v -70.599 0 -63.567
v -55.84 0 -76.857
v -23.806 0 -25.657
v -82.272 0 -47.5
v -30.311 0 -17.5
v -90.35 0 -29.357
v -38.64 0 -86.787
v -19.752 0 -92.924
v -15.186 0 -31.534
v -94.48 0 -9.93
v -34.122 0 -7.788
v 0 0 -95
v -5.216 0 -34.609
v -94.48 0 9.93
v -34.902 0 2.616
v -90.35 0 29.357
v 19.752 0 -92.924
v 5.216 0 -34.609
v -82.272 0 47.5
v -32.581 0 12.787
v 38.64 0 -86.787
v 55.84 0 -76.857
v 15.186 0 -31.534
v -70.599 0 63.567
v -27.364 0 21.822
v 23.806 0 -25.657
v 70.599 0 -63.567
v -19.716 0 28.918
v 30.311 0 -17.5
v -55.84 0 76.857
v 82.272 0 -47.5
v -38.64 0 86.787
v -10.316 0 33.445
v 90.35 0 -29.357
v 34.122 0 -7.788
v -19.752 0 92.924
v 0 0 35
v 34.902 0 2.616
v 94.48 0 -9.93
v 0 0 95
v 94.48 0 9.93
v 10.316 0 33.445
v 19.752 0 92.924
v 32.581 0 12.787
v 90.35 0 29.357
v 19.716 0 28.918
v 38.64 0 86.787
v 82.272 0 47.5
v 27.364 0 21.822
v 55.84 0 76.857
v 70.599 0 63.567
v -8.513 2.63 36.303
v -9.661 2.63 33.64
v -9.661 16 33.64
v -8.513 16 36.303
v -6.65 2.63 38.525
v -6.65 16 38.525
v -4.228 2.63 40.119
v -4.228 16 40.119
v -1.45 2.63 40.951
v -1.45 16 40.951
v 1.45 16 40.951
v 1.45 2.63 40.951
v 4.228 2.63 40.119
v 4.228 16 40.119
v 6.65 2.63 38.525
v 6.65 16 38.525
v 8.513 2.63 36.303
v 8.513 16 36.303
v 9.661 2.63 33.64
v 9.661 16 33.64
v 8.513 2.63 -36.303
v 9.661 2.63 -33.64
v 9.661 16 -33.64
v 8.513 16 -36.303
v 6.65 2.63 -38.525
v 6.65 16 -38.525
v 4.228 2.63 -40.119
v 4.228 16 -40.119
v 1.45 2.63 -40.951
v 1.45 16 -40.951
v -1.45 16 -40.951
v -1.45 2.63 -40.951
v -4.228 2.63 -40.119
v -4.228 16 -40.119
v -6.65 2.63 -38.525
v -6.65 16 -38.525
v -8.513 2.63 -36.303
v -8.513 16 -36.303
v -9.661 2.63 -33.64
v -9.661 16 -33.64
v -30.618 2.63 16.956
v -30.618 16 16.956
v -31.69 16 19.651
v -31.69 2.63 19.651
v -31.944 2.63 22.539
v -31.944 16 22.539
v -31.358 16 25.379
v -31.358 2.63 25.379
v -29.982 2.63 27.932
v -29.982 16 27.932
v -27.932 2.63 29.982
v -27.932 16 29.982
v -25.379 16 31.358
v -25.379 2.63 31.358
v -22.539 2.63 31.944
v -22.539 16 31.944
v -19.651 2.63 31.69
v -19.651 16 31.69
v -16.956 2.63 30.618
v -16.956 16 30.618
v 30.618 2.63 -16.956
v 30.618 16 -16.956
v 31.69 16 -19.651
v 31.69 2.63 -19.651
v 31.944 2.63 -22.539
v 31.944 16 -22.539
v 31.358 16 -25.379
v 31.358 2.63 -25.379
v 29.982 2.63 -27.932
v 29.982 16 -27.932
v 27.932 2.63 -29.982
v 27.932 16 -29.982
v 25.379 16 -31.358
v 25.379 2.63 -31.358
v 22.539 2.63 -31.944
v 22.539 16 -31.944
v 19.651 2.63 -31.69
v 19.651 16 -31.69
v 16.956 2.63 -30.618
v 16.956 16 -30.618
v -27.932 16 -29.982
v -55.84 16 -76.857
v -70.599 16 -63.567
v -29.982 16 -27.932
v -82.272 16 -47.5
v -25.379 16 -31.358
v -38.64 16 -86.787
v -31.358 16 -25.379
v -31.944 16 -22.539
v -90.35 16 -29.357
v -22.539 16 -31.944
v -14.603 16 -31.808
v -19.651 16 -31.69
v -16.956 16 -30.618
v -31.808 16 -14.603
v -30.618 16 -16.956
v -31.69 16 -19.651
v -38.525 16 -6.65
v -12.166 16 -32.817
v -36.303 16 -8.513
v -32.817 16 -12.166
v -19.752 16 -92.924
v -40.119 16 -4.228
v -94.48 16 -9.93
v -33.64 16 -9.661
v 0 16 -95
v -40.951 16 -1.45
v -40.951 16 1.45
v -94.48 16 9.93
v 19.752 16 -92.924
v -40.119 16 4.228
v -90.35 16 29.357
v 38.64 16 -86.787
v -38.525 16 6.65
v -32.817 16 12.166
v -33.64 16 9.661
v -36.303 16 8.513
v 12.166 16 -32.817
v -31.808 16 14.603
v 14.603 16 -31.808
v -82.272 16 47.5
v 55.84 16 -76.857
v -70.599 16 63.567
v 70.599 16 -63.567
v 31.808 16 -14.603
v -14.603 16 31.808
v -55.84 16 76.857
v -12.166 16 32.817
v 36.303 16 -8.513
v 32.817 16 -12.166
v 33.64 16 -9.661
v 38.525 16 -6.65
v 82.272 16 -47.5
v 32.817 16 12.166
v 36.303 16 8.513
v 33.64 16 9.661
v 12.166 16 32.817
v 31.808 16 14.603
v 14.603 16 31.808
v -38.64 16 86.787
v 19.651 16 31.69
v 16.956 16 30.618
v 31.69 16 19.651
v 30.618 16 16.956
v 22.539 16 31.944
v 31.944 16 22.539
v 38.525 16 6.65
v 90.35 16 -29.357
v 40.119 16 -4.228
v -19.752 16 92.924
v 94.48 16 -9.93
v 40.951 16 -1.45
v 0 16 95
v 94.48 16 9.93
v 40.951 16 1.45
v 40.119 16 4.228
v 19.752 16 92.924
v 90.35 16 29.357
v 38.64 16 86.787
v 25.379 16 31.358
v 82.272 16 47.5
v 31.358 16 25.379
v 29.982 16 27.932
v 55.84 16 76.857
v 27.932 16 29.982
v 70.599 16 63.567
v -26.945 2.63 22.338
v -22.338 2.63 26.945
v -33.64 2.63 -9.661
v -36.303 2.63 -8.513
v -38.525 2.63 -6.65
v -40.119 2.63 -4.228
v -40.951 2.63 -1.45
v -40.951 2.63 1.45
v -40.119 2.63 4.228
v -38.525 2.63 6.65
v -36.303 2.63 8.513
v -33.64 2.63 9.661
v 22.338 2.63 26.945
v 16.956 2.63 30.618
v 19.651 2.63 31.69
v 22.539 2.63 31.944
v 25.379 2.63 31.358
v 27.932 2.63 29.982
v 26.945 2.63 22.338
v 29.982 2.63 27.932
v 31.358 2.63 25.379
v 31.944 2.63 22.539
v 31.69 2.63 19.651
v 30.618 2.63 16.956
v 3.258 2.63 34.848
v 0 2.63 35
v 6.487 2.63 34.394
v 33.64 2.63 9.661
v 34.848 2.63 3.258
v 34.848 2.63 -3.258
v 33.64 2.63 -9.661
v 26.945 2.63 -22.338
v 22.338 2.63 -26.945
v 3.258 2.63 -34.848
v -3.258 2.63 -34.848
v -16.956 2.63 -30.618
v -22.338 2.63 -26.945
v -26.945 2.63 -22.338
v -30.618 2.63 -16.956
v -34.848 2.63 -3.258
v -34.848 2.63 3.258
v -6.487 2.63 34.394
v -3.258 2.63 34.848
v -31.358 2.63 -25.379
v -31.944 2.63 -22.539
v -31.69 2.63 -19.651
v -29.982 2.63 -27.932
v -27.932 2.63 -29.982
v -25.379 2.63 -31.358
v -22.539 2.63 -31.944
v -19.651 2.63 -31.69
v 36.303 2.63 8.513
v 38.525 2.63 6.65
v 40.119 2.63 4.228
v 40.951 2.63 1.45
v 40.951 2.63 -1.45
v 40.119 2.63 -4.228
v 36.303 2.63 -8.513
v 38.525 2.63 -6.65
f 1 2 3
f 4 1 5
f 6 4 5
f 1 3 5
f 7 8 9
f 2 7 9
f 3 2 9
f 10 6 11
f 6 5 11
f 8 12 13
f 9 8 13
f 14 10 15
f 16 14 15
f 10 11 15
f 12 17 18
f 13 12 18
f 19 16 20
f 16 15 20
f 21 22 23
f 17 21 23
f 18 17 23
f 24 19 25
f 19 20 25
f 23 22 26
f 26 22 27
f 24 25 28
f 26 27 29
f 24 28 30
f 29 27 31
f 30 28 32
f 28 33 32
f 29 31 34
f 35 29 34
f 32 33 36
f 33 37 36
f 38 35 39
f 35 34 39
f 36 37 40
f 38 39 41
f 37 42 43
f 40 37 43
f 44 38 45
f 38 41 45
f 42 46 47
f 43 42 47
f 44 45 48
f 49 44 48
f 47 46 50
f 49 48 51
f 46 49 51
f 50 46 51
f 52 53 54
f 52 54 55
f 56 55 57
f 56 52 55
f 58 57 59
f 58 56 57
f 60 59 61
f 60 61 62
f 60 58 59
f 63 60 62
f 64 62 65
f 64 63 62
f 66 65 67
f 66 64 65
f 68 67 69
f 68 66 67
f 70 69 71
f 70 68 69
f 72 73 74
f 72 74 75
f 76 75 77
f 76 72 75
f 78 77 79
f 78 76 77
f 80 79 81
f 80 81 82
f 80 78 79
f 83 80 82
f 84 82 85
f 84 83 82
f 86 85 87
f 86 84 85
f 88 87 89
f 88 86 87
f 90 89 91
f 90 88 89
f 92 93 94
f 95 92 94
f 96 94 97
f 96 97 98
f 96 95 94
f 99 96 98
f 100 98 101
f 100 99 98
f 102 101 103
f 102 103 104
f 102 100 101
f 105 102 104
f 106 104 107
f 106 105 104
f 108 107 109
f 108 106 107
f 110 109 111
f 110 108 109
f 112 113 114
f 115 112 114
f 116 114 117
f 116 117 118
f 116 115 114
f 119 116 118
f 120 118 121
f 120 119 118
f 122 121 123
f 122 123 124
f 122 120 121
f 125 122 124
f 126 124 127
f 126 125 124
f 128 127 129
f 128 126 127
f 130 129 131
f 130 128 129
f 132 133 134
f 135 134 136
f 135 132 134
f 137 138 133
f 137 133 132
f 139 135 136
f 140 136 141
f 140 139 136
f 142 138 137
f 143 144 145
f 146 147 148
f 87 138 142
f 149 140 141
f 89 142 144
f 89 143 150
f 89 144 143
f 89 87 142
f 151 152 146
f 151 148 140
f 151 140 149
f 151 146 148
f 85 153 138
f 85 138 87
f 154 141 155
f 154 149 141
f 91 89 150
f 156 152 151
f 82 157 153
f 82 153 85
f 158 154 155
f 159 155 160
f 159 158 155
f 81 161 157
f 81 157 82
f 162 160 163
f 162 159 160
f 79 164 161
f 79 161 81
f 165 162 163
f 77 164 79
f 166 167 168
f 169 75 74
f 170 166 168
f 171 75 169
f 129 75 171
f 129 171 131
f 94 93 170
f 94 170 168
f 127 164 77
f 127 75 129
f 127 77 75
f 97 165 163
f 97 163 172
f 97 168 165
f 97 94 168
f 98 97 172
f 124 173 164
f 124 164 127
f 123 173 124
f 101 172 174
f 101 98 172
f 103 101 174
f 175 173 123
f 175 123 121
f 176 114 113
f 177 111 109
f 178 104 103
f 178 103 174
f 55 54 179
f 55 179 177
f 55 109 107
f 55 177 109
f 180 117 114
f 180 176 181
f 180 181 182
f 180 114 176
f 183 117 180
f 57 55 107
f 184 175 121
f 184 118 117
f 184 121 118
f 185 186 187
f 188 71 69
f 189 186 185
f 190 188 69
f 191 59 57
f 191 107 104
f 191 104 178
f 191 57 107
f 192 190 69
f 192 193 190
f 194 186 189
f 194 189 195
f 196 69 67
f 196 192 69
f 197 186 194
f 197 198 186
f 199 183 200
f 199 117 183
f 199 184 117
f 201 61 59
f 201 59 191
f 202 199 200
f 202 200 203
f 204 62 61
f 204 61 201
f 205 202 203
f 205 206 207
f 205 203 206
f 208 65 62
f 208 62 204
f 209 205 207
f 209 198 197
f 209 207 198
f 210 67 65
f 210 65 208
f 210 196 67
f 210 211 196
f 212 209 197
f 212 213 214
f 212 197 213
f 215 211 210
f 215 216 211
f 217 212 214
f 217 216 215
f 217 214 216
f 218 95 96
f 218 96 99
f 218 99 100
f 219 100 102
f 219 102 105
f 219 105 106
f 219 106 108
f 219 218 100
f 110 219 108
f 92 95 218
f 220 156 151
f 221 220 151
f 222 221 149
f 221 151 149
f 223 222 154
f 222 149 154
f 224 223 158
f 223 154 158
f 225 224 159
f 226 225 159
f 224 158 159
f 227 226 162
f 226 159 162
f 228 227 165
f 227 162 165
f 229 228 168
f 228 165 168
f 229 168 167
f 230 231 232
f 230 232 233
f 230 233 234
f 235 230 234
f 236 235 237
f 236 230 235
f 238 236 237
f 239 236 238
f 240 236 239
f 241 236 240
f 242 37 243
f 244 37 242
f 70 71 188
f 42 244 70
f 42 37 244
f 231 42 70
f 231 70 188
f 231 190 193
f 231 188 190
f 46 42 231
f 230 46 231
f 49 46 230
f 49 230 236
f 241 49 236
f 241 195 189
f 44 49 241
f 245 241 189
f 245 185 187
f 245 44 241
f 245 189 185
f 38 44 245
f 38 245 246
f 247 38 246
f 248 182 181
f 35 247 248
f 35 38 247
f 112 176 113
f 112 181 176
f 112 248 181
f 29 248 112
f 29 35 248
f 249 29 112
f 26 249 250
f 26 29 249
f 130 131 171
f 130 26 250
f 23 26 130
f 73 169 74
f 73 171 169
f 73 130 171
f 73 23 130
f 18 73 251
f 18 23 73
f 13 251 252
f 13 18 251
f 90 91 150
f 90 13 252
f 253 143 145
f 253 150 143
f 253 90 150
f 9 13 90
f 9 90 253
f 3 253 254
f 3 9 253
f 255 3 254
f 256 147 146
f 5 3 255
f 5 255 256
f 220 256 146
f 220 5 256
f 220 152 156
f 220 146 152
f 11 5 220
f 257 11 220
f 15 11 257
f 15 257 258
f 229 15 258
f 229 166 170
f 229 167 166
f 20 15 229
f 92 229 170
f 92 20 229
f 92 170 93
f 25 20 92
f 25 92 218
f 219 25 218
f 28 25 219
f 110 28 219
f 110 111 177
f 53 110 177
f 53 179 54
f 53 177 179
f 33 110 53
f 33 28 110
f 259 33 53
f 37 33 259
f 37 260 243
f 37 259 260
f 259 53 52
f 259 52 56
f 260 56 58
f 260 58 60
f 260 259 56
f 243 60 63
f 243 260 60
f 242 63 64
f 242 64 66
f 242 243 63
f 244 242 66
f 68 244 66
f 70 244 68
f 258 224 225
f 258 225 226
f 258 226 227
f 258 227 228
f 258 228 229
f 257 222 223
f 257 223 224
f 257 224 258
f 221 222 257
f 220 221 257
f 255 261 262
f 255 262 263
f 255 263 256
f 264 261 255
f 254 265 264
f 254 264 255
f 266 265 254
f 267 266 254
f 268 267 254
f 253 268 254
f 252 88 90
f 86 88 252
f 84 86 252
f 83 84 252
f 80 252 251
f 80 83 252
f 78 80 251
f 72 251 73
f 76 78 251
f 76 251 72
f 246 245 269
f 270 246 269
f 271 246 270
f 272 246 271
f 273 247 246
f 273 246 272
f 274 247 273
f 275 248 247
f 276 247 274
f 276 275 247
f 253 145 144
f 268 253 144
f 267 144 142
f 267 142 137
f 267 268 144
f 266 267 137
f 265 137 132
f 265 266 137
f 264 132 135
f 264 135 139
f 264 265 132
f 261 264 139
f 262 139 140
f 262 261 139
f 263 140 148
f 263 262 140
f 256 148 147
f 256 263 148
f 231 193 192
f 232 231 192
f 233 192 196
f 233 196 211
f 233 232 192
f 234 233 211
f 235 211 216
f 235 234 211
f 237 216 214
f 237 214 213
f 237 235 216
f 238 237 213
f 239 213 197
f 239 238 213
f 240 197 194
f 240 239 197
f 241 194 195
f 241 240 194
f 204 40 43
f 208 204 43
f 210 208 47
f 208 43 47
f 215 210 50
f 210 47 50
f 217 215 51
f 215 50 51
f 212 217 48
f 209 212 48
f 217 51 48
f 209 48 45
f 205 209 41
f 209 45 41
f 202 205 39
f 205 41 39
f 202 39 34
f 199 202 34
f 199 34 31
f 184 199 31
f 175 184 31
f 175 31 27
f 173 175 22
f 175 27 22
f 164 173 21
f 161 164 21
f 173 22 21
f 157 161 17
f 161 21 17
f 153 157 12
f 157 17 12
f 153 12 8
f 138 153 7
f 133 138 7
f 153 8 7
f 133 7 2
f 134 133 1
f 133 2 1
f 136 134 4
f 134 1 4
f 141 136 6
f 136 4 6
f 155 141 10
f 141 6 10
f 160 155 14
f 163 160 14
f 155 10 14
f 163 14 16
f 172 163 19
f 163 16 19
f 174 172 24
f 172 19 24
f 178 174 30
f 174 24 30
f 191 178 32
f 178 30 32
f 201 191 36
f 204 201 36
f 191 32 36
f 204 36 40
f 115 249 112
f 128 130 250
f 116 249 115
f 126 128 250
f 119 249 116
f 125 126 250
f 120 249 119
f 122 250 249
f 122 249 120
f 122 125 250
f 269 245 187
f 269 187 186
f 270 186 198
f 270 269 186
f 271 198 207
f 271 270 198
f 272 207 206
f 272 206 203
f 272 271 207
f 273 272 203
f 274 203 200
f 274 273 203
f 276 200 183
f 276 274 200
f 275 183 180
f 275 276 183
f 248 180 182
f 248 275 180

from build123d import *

# Parameters (mm, degrees)
SKETCH1_R           = 95
BOSS_EXTRUDE1_DEPTH = 16
SKETCH2_R           = 35
CUT_EXTRUDE1_DEPTH  = 136.299667405
SKETCH3_R           = 10
CUT_EXTRUDE2_DEPTH  = 13.369874265
CIRPATTERN1_COUNT   = 8


with BuildPart() as part:
    # Sketch1 → Boss-Extrude1 (new body)
    with BuildSketch(Plane(origin=(0, 0, 0), x_dir=(1, 0, 0), z_dir=(0, 1, 0))):
        Circle(SKETCH1_R)
    extrude(amount=BOSS_EXTRUDE1_DEPTH)

    # Sketch2 → Cut-Extrude1 (cut, through all)
    with BuildSketch(Plane(origin=(0, 0, 0), x_dir=(1, 0, 0), z_dir=(0, 1, 0))):
        Circle(SKETCH2_R)
    extrude(amount=CUT_EXTRUDE1_DEPTH, mode=Mode.SUBTRACT)

    # Sketch3 → Cut-Extrude2 (cut)
    with BuildSketch(Plane(origin=(0, 16, 0), x_dir=(1, 0, 0), z_dir=(0, 1, 0))):
        with Locations((-31.056865323, 0)):
            Circle(SKETCH3_R)
    cut_extrude2 = extrude(amount=-CUT_EXTRUDE2_DEPTH, mode=Mode.SUBTRACT)

    # CirPattern1: Cut-Extrude2 ×8 about axis
    cirpattern1_axis = Axis((0, 0, 0), (0, 1, 0))
    for i in range(1, CIRPATTERN1_COUNT):
        add(cut_extrude2.rotate(cirpattern1_axis, i * 360 / CIRPATTERN1_COUNT), mode=Mode.SUBTRACT)


solid = part.part
